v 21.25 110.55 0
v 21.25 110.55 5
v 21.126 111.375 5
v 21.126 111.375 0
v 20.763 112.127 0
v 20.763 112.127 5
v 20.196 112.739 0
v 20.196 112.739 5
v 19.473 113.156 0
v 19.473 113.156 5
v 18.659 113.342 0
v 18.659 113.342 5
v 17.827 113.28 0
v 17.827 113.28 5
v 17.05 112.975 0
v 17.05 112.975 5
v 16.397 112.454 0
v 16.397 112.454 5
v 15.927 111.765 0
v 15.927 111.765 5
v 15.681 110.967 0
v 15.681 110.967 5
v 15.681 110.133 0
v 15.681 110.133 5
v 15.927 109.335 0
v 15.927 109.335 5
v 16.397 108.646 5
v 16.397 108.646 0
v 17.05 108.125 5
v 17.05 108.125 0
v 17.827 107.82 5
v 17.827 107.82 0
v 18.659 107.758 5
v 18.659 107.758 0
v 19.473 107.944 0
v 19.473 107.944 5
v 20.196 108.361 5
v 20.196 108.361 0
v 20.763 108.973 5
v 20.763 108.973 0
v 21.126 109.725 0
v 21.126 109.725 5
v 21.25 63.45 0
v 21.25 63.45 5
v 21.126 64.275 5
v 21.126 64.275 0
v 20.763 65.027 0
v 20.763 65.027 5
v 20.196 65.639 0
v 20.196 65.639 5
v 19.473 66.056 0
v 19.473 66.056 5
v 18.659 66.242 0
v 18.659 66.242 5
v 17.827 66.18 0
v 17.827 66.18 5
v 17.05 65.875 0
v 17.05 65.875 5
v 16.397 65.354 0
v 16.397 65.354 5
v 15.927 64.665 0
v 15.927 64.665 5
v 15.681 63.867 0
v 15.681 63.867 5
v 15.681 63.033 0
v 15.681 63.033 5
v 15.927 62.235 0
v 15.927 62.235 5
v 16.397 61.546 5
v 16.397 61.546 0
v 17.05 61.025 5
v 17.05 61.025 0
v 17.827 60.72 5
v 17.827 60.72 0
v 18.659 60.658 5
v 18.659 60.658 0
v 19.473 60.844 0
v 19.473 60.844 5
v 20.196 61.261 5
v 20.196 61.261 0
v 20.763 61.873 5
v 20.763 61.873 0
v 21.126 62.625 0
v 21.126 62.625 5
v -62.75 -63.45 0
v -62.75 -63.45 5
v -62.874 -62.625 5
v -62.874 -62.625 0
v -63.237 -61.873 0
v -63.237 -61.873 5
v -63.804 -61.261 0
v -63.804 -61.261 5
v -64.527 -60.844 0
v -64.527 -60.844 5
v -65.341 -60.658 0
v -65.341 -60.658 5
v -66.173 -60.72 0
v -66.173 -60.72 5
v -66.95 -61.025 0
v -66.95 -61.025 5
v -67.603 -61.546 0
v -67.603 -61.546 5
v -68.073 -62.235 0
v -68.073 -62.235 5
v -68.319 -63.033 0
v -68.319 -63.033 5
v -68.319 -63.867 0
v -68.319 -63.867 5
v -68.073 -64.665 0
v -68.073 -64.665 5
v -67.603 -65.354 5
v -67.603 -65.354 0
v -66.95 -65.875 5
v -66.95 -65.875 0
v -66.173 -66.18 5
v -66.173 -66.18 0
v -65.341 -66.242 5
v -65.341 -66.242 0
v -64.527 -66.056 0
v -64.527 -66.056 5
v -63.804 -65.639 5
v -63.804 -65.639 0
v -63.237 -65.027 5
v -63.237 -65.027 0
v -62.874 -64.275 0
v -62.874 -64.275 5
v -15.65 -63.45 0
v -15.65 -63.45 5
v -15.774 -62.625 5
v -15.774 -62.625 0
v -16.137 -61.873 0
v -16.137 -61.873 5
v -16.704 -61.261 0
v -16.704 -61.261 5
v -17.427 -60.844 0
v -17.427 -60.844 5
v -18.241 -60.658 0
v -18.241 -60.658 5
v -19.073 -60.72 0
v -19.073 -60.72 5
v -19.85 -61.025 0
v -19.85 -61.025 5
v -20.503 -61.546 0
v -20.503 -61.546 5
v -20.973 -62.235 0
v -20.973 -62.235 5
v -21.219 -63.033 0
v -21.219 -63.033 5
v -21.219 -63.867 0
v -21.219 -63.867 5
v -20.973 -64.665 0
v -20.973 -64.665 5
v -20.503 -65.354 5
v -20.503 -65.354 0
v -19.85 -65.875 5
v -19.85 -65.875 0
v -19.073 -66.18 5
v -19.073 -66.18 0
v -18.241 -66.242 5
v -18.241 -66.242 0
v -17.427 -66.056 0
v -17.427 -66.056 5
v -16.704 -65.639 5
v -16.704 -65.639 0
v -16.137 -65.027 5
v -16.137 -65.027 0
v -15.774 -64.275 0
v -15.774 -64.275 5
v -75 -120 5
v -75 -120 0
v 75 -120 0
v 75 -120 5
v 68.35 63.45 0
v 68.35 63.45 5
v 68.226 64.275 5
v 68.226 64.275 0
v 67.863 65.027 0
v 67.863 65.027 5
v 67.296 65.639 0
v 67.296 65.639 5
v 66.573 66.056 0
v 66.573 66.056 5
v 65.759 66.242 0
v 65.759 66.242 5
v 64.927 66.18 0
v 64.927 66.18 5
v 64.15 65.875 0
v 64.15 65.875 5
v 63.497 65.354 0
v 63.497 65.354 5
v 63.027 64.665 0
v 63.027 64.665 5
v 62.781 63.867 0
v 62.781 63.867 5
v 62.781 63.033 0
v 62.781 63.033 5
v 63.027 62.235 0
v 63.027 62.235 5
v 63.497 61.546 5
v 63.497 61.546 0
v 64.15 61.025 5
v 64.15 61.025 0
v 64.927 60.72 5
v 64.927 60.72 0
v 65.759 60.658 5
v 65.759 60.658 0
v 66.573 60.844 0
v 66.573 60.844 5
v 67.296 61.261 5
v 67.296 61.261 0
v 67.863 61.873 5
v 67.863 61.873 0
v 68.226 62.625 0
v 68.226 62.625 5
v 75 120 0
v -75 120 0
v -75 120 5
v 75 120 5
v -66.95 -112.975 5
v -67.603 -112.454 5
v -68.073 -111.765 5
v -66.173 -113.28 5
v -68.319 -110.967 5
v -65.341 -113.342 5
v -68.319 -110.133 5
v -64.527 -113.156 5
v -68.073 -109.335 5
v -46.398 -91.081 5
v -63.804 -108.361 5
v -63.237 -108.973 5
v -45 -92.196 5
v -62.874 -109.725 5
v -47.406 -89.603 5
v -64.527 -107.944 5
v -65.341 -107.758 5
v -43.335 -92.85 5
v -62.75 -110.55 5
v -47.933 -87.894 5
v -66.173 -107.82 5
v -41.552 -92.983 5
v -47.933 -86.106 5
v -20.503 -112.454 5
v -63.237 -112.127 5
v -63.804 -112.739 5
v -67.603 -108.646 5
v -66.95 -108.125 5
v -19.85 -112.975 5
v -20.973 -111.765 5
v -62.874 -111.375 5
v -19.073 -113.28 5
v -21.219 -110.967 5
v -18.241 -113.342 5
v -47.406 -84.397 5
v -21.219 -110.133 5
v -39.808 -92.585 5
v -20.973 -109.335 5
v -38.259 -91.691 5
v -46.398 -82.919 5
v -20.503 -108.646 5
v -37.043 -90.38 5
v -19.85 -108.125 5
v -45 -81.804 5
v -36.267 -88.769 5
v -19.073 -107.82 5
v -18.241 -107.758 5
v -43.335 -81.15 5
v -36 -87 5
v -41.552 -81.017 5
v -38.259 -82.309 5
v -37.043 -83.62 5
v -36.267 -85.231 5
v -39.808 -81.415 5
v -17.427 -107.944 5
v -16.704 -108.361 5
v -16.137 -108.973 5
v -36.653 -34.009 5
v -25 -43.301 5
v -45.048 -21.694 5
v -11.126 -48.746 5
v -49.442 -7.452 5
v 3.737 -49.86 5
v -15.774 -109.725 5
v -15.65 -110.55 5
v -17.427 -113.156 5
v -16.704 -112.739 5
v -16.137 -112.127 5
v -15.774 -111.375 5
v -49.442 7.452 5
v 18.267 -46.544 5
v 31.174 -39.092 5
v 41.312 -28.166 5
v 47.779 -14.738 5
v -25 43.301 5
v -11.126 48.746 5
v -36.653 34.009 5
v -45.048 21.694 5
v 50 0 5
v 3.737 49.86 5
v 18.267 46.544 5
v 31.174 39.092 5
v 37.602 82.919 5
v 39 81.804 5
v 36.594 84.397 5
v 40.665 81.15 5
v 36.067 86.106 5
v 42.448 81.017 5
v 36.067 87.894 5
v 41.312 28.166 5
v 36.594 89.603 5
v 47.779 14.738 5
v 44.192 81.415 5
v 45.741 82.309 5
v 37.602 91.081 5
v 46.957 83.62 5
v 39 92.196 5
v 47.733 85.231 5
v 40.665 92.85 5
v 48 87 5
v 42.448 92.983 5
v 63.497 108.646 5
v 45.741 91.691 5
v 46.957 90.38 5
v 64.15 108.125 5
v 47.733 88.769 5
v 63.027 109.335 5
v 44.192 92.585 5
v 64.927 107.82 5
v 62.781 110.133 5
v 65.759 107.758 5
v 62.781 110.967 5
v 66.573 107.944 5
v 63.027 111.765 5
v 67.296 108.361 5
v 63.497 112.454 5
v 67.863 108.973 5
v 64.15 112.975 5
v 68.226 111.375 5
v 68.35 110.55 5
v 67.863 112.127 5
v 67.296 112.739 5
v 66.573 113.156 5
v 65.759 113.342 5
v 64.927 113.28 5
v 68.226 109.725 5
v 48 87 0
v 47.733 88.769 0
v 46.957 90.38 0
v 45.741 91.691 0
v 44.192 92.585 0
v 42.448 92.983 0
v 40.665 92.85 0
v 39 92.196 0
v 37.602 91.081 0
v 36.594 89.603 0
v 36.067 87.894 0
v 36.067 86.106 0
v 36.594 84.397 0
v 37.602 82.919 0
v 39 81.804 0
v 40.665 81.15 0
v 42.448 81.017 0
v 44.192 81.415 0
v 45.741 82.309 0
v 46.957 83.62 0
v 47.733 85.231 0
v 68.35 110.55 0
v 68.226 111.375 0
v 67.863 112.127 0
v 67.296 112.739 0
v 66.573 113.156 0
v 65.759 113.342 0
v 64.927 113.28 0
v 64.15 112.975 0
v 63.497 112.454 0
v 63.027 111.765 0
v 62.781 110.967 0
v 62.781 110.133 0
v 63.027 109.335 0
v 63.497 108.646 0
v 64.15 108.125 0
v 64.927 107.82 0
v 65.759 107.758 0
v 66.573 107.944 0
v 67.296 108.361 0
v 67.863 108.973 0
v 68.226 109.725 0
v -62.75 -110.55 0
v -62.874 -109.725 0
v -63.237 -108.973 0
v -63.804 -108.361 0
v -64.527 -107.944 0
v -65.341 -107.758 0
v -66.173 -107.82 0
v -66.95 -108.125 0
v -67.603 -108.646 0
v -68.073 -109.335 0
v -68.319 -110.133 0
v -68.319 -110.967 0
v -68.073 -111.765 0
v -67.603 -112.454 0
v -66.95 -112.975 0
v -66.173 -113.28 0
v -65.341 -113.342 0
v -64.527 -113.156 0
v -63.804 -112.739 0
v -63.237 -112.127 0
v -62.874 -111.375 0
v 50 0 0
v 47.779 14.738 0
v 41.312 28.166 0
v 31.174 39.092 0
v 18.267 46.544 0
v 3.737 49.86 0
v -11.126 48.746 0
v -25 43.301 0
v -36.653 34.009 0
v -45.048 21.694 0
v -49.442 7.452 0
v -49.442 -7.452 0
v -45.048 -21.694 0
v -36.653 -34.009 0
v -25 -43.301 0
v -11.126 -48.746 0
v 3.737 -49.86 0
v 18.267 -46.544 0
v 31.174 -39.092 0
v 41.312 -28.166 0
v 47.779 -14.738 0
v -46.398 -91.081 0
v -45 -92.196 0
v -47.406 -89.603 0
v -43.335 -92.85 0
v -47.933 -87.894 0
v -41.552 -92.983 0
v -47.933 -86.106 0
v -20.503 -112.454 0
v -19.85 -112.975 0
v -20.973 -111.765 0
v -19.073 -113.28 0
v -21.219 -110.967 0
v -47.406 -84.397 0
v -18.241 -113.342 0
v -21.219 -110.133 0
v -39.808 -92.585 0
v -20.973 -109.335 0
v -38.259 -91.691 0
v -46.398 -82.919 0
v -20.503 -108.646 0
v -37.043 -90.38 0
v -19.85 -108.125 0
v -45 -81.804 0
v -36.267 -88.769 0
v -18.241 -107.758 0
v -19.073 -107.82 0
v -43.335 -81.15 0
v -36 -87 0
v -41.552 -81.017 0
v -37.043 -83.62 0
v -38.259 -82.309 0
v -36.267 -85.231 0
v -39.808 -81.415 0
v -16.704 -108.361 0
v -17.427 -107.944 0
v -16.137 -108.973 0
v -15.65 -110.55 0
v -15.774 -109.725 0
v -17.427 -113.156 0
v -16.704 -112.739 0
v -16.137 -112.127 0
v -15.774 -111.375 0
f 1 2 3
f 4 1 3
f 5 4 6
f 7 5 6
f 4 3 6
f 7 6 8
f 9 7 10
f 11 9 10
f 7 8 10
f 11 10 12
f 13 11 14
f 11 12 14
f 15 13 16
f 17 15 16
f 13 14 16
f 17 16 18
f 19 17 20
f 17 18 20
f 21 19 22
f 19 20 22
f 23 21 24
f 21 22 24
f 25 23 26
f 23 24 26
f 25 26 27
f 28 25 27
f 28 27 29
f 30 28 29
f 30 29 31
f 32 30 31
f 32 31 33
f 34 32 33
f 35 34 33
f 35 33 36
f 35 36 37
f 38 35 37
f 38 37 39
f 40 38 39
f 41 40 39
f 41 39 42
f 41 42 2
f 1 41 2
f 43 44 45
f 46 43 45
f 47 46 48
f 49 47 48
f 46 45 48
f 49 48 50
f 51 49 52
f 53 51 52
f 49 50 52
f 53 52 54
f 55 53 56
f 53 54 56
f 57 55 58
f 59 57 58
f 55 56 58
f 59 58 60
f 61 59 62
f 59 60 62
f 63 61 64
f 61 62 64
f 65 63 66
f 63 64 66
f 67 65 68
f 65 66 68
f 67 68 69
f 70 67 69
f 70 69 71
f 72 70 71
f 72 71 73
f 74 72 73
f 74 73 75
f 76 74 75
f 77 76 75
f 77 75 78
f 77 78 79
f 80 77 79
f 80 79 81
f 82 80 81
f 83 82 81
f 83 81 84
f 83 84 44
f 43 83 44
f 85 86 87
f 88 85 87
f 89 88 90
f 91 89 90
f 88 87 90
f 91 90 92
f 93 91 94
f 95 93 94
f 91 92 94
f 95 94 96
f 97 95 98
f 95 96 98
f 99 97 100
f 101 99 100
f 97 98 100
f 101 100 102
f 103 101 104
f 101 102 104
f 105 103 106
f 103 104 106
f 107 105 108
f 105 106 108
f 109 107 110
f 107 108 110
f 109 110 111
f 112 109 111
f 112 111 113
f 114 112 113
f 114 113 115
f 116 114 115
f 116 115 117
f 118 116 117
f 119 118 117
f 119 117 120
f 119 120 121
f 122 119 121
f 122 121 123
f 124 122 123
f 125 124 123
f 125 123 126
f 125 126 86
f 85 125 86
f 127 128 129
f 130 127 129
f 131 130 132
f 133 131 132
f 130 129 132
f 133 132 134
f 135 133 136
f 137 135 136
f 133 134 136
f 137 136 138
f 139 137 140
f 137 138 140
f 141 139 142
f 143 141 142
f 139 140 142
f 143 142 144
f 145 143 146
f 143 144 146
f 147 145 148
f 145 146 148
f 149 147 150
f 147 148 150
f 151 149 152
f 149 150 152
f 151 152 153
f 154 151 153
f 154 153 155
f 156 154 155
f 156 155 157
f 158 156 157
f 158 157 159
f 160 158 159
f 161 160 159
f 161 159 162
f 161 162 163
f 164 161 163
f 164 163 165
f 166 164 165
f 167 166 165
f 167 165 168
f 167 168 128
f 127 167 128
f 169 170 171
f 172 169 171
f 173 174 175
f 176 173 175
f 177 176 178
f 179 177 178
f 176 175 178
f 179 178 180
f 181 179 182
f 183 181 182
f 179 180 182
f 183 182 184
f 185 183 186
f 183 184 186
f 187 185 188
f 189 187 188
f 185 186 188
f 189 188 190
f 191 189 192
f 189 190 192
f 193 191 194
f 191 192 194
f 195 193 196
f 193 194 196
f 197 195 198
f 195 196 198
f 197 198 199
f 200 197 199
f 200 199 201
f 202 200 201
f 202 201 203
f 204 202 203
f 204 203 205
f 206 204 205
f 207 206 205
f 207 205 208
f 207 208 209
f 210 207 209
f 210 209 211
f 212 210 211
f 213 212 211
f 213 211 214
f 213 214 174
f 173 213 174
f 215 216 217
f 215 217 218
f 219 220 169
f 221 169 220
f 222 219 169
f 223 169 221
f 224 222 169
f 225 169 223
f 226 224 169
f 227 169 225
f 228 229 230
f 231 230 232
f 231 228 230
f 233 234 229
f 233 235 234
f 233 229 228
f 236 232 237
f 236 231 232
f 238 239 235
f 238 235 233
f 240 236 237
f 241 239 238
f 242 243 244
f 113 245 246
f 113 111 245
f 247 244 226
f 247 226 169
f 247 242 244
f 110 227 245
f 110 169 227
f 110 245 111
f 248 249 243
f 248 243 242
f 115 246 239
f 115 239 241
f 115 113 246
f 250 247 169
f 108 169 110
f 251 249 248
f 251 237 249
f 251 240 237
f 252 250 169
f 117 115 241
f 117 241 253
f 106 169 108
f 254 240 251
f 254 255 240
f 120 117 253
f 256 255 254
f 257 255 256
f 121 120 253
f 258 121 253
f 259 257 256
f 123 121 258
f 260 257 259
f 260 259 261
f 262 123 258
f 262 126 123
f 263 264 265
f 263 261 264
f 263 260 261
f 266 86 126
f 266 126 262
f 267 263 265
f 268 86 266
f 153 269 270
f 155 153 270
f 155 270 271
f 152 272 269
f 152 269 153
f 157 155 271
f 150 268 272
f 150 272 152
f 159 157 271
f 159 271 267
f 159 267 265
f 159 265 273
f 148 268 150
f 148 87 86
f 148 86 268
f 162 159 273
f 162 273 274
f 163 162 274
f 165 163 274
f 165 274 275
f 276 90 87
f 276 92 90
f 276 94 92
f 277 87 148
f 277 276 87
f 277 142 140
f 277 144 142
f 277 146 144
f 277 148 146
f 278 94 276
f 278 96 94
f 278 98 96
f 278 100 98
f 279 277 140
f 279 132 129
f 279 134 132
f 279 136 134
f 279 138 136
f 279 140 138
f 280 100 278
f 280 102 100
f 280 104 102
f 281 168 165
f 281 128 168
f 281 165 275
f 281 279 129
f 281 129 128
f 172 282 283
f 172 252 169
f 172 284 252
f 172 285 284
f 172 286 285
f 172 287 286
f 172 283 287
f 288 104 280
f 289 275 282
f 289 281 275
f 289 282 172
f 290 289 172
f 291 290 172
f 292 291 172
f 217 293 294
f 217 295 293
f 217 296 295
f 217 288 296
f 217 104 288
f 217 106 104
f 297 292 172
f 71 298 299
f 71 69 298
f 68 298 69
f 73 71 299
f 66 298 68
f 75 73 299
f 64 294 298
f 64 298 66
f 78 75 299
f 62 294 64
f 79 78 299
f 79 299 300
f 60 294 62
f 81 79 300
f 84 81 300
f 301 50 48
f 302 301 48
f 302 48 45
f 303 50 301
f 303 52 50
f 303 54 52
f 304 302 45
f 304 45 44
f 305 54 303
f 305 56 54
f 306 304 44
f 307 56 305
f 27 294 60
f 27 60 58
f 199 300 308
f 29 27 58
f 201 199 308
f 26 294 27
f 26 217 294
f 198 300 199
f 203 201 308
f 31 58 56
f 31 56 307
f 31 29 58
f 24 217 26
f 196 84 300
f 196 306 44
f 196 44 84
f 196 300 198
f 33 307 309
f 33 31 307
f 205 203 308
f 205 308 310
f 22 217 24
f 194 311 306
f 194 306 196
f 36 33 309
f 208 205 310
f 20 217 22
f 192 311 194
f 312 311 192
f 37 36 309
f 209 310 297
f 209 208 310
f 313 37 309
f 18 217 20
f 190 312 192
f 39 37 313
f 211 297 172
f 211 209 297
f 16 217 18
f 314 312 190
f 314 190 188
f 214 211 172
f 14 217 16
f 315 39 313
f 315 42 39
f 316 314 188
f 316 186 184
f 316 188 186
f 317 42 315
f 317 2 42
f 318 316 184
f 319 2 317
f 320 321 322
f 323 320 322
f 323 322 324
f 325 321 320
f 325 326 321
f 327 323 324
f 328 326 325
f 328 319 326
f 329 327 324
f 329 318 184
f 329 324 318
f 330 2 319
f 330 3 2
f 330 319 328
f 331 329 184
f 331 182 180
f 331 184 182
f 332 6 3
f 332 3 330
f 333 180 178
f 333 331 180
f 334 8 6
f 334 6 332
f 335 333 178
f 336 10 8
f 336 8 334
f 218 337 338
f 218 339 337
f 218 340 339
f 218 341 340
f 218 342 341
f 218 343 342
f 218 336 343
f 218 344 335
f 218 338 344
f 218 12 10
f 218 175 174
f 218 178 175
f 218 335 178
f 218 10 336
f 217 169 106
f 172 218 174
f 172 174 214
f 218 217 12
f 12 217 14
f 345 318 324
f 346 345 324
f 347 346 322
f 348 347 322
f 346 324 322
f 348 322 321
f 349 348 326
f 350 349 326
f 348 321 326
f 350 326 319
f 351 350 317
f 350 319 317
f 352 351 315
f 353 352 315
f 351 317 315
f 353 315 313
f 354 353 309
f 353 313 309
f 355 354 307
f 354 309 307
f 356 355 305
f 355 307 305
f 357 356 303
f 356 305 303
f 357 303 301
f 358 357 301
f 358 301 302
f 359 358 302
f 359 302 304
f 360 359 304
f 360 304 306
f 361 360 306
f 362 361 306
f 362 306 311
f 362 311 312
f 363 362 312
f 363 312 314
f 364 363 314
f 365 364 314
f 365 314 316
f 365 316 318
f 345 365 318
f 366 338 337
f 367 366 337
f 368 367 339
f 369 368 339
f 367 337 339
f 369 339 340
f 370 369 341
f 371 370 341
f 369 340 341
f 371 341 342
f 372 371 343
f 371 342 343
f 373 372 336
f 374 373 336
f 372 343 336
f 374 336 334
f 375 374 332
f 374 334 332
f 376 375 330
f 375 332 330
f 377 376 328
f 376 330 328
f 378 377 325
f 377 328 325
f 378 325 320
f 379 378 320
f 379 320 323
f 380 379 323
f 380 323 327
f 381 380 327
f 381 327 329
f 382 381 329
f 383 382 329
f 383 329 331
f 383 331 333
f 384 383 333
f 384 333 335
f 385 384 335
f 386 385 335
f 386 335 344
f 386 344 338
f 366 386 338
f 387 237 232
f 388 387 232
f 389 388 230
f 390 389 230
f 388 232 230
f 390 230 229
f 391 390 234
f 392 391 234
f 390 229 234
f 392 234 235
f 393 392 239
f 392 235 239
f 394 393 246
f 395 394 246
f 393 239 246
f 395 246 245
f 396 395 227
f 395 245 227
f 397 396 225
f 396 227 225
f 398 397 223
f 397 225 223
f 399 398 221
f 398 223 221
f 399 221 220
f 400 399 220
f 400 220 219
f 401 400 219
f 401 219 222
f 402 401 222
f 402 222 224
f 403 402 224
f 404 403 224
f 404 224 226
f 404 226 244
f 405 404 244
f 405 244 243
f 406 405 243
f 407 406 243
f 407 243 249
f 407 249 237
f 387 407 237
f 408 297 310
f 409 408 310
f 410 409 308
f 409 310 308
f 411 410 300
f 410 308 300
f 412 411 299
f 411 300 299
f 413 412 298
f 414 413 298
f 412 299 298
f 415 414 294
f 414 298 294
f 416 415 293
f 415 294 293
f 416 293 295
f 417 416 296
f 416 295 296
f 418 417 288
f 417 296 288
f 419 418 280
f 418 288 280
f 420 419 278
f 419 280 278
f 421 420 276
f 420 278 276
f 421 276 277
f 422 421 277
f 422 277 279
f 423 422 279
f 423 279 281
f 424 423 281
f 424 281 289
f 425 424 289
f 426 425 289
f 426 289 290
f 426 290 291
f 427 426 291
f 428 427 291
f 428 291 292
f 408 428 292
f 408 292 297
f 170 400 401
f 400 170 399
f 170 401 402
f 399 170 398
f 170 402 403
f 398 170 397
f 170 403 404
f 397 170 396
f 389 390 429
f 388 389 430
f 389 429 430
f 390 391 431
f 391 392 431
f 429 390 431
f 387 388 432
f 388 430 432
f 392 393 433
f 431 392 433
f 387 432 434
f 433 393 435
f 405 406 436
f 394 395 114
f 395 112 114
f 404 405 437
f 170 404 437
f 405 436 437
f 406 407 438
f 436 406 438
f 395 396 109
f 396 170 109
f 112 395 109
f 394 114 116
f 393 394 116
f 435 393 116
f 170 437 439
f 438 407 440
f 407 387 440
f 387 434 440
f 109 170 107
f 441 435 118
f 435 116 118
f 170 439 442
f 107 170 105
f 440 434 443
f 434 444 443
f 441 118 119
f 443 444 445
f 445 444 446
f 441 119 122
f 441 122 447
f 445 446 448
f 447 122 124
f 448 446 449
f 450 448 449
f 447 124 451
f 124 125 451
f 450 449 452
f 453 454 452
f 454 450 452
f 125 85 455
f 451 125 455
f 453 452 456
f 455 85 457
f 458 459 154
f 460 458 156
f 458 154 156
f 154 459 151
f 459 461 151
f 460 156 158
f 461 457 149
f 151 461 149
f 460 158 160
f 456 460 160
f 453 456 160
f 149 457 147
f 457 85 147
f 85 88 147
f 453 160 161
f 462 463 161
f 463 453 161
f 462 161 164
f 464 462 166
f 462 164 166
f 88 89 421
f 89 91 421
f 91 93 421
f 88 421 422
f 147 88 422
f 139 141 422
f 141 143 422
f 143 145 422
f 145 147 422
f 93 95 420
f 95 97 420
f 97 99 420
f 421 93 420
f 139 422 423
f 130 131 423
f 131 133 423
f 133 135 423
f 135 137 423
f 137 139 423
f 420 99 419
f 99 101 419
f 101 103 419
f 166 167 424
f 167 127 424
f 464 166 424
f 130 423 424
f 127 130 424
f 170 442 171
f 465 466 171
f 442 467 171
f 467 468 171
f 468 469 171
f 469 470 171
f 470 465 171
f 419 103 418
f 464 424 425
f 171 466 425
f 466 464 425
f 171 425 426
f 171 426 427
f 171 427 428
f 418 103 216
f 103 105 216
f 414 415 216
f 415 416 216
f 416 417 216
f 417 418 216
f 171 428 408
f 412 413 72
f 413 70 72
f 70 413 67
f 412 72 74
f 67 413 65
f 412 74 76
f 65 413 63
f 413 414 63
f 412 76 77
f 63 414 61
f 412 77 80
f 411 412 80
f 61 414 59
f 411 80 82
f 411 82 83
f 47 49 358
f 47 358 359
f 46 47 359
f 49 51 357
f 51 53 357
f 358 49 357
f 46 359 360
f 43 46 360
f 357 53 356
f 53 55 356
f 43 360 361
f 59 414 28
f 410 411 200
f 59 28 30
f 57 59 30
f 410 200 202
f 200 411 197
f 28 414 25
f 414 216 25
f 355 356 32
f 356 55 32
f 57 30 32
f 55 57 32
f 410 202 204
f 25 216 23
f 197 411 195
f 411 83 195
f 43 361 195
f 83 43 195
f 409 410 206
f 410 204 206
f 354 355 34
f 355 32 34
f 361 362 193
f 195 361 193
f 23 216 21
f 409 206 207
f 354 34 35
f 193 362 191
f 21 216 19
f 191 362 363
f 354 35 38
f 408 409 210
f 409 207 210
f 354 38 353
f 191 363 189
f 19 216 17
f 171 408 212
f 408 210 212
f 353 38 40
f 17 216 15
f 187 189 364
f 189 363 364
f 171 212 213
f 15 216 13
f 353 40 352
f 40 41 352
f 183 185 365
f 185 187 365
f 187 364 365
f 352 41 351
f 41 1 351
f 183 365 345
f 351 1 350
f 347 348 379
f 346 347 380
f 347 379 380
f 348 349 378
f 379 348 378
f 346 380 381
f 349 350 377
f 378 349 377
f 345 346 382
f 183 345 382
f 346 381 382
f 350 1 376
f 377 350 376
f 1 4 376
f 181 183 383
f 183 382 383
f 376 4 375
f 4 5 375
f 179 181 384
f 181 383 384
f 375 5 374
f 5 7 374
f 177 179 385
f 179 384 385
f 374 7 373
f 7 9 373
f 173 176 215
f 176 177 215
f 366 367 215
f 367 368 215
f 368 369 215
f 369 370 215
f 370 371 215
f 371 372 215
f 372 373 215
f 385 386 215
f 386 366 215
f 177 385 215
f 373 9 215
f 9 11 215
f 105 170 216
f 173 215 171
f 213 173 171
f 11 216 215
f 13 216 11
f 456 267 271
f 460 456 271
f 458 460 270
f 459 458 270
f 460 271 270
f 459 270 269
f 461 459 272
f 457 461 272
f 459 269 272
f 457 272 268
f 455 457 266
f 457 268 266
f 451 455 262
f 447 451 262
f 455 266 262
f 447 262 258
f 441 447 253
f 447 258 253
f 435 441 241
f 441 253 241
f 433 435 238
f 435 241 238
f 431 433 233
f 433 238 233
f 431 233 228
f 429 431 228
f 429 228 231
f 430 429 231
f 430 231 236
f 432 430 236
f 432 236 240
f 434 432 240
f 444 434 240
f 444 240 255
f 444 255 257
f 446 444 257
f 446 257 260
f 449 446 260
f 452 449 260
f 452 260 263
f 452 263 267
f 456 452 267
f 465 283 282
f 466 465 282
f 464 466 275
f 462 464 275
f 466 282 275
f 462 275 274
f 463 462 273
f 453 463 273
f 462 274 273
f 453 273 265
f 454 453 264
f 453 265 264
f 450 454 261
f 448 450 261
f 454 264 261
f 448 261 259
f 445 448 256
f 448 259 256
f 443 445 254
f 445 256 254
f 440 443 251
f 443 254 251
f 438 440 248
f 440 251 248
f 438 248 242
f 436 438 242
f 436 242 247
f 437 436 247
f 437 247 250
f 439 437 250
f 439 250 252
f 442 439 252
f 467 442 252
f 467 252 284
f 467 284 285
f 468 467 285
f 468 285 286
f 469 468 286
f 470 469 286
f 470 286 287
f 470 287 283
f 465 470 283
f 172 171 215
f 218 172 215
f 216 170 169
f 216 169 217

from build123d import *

# Parameters (mm, degrees)
SKETCH1_W               = 150
SKETCH1_H               = 240
BOSS_EXTRUDE1_DEPTH     = 5
SKETCH7_R               = 2.8
SKETCH7_R_2             = 6
CUT_EXTRUDE4_DEPTH      = 142.598022585
SKETCH8_R               = 50
CUT_EXTRUDE5_DEPTH      = 142.598022585
DELETEFACE1_OUTLINE_R   = 6
DELETEFACE1_OUTLINE_R_2 = 2.8
DELETEFACE1_DEPTH       = 5


# Read off the part's stored shape, not the designer's step: DeleteFace1
with BuildPart() as part:
    # Sketch1 → Boss-Extrude1 (new body)
    with BuildSketch(Plane.XY):
        Rectangle(SKETCH1_W, SKETCH1_H)
    extrude(amount=BOSS_EXTRUDE1_DEPTH)

    # Sketch7 → Cut-Extrude4 (cut, through all)
    with BuildSketch(Plane.XY.offset(5)):
        with Locations((-65.55, -110.55)):
            Circle(SKETCH7_R)
        with Locations((-65.55, -63.45)):
            Circle(SKETCH7_R)
        with Locations((-18.45, -63.45)):
            Circle(SKETCH7_R)
        with Locations((-18.45, -110.55)):
            Circle(SKETCH7_R)
        with Locations(Location((-18.45, 110.55, 0), (0, 0, 180))):
            Circle(SKETCH7_R)
        with Locations(Location((-18.45, 63.45, 0), (0, 0, 180))):
            Circle(SKETCH7_R)
        with Locations(Location((-65.55, 63.45, 0), (0, 0, 180))):
            Circle(SKETCH7_R)
        with Locations(Location((-65.55, 110.55, 0), (0, 0, 180))):
            Circle(SKETCH7_R)
        with Locations((65.55, 110.55)):
            Circle(SKETCH7_R)
        with Locations((65.55, 63.45)):
            Circle(SKETCH7_R)
        with Locations((18.45, 63.45)):
            Circle(SKETCH7_R)
        with Locations((18.45, 110.55)):
            Circle(SKETCH7_R)
        with Locations(Location((18.45, -110.55, 0), (0, 0, 180))):
            Circle(SKETCH7_R)
        with Locations(Location((18.45, -63.45, 0), (0, 0, 180))):
            Circle(SKETCH7_R)
        with Locations(Location((65.55, -63.45, 0), (0, 0, 180))):
            Circle(SKETCH7_R)
        with Locations(Location((65.55, -110.55, 0), (0, 0, 180))):
            Circle(SKETCH7_R)
        with Locations((-42, -87)):
            Circle(SKETCH7_R_2)
        with Locations(Location((-42, 87, 0), (0, 0, 180))):
            Circle(SKETCH7_R_2)
        with Locations((42, 87)):
            Circle(SKETCH7_R_2)
        with Locations(Location((42, -87, 0), (0, 0, 180))):
            Circle(SKETCH7_R_2)
    extrude(amount=-CUT_EXTRUDE4_DEPTH, mode=Mode.SUBTRACT)

    # Sketch8 → Cut-Extrude5 (cut, through all)
    with BuildSketch(Plane.XY.offset(5)):
        Circle(SKETCH8_R)
    extrude(amount=-CUT_EXTRUDE5_DEPTH, mode=Mode.SUBTRACT)

    # DeleteFace1 outline → DeleteFace1 (add)
    with BuildSketch(Plane.XY):
        with Locations((42, -87)):
            Circle(DELETEFACE1_OUTLINE_R)
        with Locations((-42, 87)):
            Circle(DELETEFACE1_OUTLINE_R)
        with Locations((-65.55, 110.55)):
            Circle(DELETEFACE1_OUTLINE_R_2)
        with Locations((-65.55, 63.45)):
            Circle(DELETEFACE1_OUTLINE_R_2)
        with Locations((-18.45, 63.45)):
            Circle(DELETEFACE1_OUTLINE_R_2)
        with Locations((-18.45, 110.55)):
            Circle(DELETEFACE1_OUTLINE_R_2)
        with Locations((65.55, -110.55)):
            Circle(DELETEFACE1_OUTLINE_R_2)
        with Locations((65.55, -63.45)):
            Circle(DELETEFACE1_OUTLINE_R_2)
        with Locations((18.45, -63.45)):
            Circle(DELETEFACE1_OUTLINE_R_2)
        with Locations((18.45, -110.55)):
            Circle(DELETEFACE1_OUTLINE_R_2)
    extrude(amount=DELETEFACE1_DEPTH)


solid = part.part
